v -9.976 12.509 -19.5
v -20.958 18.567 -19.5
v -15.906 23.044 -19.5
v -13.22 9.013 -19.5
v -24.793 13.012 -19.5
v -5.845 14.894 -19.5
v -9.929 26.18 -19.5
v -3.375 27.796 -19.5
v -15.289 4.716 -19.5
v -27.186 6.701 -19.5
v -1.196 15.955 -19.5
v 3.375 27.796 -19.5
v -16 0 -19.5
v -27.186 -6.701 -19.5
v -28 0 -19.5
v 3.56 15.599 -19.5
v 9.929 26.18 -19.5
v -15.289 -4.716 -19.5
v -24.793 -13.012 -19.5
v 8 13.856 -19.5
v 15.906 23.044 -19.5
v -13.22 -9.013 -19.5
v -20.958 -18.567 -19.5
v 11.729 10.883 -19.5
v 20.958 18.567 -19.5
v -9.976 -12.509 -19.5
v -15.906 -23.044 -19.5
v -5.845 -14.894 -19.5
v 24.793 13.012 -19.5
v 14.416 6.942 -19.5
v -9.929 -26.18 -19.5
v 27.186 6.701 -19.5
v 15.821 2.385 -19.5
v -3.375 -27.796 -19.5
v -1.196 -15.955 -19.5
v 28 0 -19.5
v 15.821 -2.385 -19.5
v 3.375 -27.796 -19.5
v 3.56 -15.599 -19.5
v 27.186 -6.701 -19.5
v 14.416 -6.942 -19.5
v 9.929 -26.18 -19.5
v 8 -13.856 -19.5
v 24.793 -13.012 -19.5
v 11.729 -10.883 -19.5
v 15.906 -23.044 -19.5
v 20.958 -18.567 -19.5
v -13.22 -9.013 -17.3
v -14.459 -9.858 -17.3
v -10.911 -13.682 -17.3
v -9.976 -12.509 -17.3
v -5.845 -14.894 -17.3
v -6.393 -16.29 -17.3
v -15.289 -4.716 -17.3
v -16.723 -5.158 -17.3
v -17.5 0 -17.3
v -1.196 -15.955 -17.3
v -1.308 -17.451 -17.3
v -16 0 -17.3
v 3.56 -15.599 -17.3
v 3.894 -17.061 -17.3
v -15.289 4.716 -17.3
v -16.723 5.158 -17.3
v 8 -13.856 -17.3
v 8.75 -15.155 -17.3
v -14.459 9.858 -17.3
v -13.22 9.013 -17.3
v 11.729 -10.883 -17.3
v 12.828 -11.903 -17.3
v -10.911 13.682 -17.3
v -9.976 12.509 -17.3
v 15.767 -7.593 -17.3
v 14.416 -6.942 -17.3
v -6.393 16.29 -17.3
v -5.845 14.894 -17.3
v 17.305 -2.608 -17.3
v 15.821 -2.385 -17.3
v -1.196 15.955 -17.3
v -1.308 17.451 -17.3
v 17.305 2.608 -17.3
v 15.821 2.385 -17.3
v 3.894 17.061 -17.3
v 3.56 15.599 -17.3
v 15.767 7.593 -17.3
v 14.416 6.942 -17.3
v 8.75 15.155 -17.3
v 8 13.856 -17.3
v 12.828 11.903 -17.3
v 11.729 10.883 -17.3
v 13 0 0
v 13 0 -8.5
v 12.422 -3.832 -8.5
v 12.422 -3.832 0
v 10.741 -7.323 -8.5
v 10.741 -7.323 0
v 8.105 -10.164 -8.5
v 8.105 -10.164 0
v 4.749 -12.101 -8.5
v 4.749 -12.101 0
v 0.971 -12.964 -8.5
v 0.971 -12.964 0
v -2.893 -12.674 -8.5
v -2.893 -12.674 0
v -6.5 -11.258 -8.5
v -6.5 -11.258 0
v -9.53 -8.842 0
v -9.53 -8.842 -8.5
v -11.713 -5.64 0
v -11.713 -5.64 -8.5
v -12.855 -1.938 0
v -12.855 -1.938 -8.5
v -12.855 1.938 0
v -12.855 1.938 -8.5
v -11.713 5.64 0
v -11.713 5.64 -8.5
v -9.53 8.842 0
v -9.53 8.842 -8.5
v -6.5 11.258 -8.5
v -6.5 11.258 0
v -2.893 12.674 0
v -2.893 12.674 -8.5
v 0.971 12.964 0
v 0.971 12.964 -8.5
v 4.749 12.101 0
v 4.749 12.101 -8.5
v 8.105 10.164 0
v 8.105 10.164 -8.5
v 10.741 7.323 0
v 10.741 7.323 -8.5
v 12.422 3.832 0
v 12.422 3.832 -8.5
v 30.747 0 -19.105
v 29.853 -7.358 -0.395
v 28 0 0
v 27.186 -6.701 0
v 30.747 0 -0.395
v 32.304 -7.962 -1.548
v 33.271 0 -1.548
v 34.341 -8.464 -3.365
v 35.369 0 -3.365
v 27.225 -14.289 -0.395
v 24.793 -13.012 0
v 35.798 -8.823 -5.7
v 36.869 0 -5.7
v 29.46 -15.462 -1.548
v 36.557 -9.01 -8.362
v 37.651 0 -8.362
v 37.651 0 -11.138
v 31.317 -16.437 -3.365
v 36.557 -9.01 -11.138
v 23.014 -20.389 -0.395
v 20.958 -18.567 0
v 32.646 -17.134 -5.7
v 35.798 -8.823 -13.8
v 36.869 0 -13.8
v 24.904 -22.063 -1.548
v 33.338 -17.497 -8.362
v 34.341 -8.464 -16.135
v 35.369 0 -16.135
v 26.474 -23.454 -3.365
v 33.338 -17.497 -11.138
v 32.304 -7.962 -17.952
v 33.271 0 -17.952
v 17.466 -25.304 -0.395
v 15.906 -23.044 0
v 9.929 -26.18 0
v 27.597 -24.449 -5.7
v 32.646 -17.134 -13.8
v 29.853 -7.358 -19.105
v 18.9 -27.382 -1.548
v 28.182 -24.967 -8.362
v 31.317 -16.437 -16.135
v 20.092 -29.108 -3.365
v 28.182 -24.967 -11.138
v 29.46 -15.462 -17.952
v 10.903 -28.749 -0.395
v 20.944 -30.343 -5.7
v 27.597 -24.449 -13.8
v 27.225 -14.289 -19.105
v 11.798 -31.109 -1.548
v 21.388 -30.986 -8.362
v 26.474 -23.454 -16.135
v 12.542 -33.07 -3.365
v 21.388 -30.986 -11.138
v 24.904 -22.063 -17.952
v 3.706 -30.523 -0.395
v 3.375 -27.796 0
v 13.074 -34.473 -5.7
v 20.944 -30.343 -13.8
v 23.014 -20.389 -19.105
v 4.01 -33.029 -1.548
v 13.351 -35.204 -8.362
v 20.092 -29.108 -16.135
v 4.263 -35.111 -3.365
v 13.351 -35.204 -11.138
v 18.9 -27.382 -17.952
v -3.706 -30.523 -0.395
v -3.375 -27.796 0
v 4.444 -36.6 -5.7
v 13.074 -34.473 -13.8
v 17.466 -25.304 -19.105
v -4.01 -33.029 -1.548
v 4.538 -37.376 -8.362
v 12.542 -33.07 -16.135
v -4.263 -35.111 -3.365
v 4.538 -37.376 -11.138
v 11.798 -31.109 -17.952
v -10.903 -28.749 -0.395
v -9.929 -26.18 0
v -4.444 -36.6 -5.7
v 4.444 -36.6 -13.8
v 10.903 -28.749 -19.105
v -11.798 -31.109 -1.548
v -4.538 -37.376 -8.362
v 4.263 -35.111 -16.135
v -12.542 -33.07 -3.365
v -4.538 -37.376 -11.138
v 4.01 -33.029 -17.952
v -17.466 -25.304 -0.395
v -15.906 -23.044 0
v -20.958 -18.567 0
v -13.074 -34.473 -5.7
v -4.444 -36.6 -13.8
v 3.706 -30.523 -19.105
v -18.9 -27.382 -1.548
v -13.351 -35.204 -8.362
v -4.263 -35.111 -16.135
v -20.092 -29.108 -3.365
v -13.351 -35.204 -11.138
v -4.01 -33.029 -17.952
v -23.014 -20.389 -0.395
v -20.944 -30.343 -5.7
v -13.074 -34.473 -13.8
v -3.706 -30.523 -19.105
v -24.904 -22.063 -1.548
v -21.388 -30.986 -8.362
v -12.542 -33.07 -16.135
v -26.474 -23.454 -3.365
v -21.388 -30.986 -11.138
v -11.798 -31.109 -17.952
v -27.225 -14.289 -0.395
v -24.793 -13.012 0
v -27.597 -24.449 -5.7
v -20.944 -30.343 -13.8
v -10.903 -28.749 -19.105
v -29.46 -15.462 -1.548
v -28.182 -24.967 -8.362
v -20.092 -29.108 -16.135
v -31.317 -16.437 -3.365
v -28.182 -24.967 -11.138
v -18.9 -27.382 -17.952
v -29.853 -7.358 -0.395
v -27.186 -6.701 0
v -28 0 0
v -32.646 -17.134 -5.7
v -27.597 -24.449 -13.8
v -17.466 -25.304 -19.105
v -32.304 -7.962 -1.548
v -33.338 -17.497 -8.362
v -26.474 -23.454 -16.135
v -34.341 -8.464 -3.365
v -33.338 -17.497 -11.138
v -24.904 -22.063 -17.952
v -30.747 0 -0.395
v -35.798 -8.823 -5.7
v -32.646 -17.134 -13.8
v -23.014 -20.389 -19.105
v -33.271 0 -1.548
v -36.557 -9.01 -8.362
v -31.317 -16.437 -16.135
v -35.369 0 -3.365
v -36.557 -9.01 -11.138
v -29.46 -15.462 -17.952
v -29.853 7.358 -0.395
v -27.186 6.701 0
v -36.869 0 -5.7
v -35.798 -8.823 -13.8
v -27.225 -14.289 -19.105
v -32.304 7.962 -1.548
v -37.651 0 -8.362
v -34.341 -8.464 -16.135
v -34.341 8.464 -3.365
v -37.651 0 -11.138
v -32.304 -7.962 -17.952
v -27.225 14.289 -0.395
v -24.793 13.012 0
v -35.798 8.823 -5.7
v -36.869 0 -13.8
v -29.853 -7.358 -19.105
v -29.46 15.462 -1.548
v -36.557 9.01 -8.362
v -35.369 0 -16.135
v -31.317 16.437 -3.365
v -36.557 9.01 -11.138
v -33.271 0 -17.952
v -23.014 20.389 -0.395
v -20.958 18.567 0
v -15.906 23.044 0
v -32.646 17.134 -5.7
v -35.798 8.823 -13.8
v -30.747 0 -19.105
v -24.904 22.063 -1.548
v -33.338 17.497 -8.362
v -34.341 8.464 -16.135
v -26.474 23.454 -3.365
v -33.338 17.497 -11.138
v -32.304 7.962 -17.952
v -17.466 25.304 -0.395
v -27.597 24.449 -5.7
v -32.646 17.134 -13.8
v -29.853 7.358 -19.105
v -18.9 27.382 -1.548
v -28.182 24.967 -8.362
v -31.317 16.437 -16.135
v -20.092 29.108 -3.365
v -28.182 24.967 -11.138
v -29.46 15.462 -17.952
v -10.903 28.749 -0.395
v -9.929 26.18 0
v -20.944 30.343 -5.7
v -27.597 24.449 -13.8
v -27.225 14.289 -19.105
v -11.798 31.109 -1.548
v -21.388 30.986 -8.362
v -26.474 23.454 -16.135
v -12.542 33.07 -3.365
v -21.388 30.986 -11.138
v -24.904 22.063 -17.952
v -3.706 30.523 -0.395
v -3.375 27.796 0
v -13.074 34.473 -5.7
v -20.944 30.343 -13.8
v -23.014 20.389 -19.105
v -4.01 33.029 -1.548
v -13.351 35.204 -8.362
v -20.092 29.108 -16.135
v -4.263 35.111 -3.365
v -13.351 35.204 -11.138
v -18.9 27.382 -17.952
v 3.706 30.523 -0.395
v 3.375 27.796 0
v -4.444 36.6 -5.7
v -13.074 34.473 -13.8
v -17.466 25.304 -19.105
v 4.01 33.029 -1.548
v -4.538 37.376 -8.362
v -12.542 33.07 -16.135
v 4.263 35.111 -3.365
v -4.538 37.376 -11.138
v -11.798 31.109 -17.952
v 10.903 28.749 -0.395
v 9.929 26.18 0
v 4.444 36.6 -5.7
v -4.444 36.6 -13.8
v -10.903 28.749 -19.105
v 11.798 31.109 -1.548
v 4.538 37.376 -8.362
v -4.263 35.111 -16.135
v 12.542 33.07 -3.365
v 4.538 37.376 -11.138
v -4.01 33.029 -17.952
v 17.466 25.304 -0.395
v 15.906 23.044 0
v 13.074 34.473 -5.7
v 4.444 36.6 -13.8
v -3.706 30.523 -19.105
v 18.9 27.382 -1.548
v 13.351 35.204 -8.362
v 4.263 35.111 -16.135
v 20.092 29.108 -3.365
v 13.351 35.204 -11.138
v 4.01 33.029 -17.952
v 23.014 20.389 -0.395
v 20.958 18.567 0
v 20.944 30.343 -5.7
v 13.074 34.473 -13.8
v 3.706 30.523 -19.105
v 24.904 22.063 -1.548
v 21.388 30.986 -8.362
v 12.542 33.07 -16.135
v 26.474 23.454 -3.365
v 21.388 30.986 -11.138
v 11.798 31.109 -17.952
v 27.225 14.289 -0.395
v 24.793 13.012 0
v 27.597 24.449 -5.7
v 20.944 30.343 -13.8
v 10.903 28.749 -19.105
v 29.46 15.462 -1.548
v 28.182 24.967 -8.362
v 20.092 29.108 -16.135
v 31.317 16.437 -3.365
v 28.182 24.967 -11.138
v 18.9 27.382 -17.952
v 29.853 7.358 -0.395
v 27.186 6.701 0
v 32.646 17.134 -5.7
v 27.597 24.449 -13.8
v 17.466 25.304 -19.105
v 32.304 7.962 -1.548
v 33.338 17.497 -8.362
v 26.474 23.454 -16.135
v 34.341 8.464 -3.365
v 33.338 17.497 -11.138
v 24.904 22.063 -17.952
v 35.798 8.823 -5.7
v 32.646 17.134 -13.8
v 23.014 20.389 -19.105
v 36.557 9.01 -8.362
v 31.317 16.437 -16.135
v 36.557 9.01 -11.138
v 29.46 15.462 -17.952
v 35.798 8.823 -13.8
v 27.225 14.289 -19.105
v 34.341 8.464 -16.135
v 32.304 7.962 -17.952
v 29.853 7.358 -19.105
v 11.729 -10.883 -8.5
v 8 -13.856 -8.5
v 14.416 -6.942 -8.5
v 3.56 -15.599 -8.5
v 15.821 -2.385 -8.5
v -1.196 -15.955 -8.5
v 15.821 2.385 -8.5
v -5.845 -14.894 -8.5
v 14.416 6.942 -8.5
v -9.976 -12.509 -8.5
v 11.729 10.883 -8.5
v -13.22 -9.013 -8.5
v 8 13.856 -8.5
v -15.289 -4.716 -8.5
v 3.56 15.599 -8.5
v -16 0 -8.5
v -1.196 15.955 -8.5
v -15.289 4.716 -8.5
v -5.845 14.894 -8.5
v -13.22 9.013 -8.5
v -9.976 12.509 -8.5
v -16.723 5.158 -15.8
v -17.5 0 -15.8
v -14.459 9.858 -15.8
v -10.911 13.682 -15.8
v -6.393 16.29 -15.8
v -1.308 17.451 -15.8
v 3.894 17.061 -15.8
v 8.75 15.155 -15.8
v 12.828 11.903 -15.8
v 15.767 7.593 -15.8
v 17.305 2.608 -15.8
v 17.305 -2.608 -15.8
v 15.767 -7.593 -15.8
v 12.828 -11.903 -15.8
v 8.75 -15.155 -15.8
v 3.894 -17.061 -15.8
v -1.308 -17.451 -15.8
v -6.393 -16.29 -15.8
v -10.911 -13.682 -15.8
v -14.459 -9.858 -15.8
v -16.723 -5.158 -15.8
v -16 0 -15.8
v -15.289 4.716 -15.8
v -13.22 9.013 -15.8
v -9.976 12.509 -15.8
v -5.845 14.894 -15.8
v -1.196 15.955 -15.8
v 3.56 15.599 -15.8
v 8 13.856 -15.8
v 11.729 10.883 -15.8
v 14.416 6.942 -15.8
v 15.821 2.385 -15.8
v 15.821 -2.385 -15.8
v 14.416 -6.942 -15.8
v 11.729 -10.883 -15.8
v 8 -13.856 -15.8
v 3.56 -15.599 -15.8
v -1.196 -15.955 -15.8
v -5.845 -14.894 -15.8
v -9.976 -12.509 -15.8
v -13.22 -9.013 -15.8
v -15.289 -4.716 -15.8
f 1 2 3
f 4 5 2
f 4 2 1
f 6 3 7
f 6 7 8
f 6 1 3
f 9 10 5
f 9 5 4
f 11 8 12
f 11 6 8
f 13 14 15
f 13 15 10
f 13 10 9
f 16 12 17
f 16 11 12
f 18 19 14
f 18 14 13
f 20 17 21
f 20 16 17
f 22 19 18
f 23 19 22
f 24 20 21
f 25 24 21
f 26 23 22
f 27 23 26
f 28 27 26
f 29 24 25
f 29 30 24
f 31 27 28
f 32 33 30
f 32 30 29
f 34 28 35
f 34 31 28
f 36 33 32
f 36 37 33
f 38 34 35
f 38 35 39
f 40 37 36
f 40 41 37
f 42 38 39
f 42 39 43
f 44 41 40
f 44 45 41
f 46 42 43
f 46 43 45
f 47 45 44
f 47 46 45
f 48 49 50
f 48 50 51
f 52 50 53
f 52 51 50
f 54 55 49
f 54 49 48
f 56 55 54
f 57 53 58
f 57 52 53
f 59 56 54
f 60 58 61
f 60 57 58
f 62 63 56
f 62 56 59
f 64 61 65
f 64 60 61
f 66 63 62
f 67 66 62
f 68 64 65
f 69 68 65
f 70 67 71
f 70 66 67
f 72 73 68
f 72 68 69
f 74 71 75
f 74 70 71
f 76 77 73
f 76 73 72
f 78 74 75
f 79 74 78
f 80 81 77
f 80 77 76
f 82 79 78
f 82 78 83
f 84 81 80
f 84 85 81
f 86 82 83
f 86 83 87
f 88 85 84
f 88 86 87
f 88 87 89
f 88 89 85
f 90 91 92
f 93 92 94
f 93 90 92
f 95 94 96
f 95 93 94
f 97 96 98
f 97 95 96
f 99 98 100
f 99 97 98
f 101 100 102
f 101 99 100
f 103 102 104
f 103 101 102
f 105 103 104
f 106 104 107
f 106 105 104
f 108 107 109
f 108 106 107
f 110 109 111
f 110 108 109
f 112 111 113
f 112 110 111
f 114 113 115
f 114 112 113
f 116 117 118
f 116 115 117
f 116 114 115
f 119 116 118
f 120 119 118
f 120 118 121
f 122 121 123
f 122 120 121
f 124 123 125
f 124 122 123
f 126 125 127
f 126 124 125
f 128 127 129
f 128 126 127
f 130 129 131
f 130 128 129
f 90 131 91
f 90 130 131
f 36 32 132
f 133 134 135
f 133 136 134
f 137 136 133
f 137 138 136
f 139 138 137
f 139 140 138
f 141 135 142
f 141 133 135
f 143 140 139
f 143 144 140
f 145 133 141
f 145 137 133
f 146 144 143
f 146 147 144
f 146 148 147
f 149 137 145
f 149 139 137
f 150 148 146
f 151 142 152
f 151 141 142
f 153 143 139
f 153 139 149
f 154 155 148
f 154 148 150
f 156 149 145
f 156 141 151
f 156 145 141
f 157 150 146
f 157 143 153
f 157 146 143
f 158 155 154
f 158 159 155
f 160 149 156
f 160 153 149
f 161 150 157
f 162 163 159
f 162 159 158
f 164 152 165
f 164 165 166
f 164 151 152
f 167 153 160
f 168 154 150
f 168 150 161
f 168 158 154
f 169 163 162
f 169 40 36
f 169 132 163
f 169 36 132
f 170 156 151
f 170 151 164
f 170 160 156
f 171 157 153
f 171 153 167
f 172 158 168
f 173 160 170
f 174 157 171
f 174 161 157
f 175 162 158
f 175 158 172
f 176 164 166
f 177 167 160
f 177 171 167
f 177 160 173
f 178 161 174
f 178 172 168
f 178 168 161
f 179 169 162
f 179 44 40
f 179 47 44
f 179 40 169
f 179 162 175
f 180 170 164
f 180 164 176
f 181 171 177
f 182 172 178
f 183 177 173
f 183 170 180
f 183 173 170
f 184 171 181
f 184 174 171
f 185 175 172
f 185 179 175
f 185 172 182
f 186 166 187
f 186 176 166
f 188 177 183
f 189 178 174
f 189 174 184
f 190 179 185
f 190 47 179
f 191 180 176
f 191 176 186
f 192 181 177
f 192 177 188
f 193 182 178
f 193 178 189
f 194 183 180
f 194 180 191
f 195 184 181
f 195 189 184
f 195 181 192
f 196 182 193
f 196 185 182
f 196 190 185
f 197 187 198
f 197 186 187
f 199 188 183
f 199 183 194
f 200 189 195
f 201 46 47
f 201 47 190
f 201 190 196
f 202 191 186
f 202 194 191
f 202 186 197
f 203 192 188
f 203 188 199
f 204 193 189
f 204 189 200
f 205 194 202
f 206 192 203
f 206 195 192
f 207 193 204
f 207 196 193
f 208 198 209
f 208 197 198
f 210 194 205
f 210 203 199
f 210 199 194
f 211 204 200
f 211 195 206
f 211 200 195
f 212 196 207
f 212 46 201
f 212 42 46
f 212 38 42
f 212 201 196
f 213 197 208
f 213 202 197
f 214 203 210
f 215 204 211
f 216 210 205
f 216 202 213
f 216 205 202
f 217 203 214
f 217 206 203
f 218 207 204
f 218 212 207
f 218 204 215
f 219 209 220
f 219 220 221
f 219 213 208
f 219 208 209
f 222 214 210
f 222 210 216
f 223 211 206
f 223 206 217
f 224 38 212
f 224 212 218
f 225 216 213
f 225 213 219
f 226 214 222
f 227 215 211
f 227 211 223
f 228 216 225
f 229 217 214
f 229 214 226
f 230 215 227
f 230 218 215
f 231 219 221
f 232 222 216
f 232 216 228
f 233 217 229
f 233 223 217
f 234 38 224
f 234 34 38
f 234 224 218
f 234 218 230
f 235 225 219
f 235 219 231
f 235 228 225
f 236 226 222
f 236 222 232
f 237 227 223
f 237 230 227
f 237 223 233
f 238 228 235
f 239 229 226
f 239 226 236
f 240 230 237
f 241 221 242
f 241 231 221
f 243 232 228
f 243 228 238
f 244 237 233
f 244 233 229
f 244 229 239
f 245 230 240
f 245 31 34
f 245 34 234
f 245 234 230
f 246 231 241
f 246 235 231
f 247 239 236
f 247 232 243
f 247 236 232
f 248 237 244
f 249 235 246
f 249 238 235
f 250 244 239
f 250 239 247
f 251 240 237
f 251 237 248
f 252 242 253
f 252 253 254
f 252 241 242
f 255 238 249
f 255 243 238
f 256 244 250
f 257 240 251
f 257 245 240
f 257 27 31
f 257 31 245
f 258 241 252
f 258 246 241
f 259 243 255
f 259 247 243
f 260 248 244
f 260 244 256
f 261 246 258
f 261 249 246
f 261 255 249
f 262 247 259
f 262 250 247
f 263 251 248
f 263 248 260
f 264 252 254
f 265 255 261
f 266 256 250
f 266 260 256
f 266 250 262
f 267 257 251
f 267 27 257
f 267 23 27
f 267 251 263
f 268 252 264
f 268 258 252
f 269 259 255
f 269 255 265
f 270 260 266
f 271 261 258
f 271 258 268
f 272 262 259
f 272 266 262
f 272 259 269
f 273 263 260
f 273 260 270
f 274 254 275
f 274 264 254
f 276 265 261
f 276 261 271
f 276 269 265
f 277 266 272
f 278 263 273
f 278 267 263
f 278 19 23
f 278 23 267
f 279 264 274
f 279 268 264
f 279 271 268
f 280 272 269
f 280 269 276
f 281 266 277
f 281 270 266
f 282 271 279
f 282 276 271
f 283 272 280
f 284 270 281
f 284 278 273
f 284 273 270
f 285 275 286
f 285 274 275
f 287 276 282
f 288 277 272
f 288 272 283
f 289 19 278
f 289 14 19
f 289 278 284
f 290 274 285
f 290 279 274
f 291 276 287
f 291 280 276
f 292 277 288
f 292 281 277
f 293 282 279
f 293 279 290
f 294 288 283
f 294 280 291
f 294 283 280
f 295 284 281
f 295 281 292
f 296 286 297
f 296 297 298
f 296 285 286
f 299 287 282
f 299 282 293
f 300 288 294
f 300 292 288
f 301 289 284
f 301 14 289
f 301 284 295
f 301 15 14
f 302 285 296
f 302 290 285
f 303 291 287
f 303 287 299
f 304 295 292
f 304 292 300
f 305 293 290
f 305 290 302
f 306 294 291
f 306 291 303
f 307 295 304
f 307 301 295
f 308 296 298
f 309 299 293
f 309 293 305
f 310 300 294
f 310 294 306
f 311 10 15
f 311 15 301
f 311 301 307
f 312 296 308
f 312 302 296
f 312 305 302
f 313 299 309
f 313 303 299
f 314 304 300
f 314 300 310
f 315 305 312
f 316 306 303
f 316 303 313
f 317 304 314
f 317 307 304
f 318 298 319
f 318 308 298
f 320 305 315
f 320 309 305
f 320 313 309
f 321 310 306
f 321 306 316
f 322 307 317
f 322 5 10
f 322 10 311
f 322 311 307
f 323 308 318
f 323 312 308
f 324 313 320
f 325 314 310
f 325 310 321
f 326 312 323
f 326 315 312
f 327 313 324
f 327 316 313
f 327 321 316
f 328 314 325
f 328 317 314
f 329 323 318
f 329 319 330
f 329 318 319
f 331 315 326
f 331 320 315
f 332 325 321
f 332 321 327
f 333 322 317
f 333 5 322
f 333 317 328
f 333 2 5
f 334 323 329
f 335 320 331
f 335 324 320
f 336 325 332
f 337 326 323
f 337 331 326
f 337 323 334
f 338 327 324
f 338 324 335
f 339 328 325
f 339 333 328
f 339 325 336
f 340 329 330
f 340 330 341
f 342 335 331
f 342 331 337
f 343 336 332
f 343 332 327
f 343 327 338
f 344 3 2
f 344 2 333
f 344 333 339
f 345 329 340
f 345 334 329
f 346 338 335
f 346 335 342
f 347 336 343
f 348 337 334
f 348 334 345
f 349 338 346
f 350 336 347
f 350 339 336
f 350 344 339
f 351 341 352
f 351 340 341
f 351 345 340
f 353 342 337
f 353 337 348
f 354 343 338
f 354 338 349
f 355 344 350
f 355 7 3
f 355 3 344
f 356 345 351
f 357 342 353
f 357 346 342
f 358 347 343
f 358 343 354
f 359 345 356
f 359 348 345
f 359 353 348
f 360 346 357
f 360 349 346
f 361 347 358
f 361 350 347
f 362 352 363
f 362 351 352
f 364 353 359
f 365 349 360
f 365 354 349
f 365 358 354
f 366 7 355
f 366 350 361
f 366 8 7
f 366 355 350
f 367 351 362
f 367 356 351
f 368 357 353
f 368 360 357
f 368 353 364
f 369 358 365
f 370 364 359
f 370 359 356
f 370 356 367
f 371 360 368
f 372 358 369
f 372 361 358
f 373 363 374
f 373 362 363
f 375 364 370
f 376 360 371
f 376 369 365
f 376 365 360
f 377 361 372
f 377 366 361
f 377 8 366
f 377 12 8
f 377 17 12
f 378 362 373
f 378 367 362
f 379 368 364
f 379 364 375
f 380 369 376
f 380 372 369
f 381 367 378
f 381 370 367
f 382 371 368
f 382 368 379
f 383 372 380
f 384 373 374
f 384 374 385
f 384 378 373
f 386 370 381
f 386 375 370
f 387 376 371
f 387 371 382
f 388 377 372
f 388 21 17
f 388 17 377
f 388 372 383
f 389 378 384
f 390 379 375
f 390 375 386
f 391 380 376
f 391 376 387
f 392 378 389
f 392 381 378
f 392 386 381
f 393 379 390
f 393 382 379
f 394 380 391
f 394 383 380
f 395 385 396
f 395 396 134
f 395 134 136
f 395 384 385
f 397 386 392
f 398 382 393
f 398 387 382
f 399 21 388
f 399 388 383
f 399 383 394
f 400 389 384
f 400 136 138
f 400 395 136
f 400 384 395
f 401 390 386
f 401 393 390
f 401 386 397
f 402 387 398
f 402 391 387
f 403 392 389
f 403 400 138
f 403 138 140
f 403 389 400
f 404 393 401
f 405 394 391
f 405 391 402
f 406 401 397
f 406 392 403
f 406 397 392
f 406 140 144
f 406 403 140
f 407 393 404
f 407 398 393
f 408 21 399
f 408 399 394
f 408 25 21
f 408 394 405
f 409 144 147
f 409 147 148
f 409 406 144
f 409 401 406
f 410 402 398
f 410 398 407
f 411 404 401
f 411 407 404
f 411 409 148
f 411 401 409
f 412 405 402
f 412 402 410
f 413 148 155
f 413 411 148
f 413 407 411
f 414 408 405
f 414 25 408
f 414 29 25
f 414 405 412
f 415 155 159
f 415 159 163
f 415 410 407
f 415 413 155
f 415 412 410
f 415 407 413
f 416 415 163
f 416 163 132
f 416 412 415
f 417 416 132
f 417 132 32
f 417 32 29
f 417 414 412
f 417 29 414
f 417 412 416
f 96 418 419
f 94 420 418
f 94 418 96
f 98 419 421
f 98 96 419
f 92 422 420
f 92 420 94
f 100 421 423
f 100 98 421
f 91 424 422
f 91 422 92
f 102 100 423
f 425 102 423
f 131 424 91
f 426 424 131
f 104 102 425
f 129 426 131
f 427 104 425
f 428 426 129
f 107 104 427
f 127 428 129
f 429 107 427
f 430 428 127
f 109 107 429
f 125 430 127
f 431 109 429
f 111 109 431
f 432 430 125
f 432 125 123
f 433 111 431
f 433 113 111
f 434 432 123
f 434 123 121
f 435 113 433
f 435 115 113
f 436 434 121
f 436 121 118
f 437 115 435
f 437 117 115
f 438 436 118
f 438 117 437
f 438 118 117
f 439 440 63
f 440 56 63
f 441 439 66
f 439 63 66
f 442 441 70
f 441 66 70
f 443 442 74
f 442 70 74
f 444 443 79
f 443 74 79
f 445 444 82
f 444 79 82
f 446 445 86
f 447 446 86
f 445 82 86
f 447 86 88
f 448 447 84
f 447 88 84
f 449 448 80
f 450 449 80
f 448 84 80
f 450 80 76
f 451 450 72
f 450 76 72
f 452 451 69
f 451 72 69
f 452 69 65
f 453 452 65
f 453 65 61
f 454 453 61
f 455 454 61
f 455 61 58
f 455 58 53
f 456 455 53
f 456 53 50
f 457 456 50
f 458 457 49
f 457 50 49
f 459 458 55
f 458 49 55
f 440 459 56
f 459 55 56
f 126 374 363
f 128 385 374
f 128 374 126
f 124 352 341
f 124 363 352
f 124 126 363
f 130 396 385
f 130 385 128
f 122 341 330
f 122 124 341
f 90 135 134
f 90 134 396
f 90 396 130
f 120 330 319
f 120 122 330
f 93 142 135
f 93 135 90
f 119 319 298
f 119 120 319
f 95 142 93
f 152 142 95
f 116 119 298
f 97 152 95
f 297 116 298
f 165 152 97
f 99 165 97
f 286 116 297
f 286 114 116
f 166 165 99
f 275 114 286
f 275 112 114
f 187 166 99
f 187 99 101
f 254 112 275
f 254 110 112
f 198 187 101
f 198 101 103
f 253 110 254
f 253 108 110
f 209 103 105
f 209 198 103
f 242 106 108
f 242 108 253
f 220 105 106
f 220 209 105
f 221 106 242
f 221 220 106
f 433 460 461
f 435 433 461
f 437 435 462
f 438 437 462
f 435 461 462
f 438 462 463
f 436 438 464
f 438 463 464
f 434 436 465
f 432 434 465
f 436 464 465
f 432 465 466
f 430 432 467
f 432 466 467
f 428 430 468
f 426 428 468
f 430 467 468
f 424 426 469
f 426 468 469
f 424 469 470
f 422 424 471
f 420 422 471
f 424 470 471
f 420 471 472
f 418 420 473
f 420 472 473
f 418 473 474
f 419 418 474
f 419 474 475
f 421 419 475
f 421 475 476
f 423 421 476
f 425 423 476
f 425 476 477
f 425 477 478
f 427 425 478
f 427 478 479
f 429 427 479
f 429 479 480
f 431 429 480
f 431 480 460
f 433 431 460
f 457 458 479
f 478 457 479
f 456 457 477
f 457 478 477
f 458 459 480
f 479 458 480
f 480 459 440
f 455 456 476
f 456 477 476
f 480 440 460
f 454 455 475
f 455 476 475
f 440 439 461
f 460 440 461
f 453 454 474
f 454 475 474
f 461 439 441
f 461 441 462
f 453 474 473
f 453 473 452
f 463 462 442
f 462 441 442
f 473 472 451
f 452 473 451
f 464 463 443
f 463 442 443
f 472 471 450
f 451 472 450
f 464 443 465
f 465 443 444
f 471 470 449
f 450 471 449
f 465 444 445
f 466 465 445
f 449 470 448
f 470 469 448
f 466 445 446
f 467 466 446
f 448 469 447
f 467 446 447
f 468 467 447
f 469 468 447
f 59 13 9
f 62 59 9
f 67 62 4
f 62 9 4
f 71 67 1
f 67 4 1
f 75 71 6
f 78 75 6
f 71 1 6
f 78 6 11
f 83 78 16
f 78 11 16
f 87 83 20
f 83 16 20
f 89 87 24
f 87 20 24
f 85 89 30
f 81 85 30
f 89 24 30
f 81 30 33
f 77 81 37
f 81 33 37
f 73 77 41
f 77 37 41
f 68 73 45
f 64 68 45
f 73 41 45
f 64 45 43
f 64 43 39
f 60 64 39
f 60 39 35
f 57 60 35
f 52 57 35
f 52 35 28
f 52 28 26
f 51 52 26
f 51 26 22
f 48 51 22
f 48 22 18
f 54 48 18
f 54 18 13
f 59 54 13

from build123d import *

# Parameters (mm, degrees)
SKETCH_2_R          = 16
CUT_EXTRUDE_1_DEPTH = 11
SKETCH_3_W          = 1.5
SKETCH_3_H          = 1.5


with BuildPart() as part:
    # 草图1 → 旋转1 (revolve)
    with BuildSketch(Plane(origin=(0, 0, 0), x_dir=(1, 0, 0), z_dir=(0, 1, 0))):
        with BuildLine():
            Line((13, 0), (28, 0))
            ThreePointArc((28, 0), (37.75, 9.75), (28, 19.5))
            Line((28, 19.5), (13, 19.5))
            Line((13, 19.5), (13, 0))
        make_face()
    revolve(axis=Axis((0, 0, 0), (0, 0, -1)))

    # 草图2 → 切除-拉伸1 (cut)
    with BuildSketch(Plane(origin=(0, 0, -19.5), x_dir=(-1, 0, 0), z_dir=(0, 0, -1))):
        Circle(SKETCH_2_R)
    extrude(amount=-CUT_EXTRUDE_1_DEPTH, mode=Mode.SUBTRACT)

    # 草图3 → 切除-旋转1 (revolve, cut)
    with BuildSketch(Plane(origin=(0, 0, 0), x_dir=(1, 0, 0), z_dir=(0, 1, 0)), mode=Mode.PRIVATE) as cut_revolve_1_sk:
        with Locations((16.75, 16.55)):
            Rectangle(SKETCH_3_W, SKETCH_3_H)
    revolve(cut_revolve_1_sk.sketch.rotate(Axis((0, 0, 0), (0, 0, -1)), 180), axis=Axis((0, 0, 0), (0, 0, -1)), mode=Mode.SUBTRACT)


solid = part.part
